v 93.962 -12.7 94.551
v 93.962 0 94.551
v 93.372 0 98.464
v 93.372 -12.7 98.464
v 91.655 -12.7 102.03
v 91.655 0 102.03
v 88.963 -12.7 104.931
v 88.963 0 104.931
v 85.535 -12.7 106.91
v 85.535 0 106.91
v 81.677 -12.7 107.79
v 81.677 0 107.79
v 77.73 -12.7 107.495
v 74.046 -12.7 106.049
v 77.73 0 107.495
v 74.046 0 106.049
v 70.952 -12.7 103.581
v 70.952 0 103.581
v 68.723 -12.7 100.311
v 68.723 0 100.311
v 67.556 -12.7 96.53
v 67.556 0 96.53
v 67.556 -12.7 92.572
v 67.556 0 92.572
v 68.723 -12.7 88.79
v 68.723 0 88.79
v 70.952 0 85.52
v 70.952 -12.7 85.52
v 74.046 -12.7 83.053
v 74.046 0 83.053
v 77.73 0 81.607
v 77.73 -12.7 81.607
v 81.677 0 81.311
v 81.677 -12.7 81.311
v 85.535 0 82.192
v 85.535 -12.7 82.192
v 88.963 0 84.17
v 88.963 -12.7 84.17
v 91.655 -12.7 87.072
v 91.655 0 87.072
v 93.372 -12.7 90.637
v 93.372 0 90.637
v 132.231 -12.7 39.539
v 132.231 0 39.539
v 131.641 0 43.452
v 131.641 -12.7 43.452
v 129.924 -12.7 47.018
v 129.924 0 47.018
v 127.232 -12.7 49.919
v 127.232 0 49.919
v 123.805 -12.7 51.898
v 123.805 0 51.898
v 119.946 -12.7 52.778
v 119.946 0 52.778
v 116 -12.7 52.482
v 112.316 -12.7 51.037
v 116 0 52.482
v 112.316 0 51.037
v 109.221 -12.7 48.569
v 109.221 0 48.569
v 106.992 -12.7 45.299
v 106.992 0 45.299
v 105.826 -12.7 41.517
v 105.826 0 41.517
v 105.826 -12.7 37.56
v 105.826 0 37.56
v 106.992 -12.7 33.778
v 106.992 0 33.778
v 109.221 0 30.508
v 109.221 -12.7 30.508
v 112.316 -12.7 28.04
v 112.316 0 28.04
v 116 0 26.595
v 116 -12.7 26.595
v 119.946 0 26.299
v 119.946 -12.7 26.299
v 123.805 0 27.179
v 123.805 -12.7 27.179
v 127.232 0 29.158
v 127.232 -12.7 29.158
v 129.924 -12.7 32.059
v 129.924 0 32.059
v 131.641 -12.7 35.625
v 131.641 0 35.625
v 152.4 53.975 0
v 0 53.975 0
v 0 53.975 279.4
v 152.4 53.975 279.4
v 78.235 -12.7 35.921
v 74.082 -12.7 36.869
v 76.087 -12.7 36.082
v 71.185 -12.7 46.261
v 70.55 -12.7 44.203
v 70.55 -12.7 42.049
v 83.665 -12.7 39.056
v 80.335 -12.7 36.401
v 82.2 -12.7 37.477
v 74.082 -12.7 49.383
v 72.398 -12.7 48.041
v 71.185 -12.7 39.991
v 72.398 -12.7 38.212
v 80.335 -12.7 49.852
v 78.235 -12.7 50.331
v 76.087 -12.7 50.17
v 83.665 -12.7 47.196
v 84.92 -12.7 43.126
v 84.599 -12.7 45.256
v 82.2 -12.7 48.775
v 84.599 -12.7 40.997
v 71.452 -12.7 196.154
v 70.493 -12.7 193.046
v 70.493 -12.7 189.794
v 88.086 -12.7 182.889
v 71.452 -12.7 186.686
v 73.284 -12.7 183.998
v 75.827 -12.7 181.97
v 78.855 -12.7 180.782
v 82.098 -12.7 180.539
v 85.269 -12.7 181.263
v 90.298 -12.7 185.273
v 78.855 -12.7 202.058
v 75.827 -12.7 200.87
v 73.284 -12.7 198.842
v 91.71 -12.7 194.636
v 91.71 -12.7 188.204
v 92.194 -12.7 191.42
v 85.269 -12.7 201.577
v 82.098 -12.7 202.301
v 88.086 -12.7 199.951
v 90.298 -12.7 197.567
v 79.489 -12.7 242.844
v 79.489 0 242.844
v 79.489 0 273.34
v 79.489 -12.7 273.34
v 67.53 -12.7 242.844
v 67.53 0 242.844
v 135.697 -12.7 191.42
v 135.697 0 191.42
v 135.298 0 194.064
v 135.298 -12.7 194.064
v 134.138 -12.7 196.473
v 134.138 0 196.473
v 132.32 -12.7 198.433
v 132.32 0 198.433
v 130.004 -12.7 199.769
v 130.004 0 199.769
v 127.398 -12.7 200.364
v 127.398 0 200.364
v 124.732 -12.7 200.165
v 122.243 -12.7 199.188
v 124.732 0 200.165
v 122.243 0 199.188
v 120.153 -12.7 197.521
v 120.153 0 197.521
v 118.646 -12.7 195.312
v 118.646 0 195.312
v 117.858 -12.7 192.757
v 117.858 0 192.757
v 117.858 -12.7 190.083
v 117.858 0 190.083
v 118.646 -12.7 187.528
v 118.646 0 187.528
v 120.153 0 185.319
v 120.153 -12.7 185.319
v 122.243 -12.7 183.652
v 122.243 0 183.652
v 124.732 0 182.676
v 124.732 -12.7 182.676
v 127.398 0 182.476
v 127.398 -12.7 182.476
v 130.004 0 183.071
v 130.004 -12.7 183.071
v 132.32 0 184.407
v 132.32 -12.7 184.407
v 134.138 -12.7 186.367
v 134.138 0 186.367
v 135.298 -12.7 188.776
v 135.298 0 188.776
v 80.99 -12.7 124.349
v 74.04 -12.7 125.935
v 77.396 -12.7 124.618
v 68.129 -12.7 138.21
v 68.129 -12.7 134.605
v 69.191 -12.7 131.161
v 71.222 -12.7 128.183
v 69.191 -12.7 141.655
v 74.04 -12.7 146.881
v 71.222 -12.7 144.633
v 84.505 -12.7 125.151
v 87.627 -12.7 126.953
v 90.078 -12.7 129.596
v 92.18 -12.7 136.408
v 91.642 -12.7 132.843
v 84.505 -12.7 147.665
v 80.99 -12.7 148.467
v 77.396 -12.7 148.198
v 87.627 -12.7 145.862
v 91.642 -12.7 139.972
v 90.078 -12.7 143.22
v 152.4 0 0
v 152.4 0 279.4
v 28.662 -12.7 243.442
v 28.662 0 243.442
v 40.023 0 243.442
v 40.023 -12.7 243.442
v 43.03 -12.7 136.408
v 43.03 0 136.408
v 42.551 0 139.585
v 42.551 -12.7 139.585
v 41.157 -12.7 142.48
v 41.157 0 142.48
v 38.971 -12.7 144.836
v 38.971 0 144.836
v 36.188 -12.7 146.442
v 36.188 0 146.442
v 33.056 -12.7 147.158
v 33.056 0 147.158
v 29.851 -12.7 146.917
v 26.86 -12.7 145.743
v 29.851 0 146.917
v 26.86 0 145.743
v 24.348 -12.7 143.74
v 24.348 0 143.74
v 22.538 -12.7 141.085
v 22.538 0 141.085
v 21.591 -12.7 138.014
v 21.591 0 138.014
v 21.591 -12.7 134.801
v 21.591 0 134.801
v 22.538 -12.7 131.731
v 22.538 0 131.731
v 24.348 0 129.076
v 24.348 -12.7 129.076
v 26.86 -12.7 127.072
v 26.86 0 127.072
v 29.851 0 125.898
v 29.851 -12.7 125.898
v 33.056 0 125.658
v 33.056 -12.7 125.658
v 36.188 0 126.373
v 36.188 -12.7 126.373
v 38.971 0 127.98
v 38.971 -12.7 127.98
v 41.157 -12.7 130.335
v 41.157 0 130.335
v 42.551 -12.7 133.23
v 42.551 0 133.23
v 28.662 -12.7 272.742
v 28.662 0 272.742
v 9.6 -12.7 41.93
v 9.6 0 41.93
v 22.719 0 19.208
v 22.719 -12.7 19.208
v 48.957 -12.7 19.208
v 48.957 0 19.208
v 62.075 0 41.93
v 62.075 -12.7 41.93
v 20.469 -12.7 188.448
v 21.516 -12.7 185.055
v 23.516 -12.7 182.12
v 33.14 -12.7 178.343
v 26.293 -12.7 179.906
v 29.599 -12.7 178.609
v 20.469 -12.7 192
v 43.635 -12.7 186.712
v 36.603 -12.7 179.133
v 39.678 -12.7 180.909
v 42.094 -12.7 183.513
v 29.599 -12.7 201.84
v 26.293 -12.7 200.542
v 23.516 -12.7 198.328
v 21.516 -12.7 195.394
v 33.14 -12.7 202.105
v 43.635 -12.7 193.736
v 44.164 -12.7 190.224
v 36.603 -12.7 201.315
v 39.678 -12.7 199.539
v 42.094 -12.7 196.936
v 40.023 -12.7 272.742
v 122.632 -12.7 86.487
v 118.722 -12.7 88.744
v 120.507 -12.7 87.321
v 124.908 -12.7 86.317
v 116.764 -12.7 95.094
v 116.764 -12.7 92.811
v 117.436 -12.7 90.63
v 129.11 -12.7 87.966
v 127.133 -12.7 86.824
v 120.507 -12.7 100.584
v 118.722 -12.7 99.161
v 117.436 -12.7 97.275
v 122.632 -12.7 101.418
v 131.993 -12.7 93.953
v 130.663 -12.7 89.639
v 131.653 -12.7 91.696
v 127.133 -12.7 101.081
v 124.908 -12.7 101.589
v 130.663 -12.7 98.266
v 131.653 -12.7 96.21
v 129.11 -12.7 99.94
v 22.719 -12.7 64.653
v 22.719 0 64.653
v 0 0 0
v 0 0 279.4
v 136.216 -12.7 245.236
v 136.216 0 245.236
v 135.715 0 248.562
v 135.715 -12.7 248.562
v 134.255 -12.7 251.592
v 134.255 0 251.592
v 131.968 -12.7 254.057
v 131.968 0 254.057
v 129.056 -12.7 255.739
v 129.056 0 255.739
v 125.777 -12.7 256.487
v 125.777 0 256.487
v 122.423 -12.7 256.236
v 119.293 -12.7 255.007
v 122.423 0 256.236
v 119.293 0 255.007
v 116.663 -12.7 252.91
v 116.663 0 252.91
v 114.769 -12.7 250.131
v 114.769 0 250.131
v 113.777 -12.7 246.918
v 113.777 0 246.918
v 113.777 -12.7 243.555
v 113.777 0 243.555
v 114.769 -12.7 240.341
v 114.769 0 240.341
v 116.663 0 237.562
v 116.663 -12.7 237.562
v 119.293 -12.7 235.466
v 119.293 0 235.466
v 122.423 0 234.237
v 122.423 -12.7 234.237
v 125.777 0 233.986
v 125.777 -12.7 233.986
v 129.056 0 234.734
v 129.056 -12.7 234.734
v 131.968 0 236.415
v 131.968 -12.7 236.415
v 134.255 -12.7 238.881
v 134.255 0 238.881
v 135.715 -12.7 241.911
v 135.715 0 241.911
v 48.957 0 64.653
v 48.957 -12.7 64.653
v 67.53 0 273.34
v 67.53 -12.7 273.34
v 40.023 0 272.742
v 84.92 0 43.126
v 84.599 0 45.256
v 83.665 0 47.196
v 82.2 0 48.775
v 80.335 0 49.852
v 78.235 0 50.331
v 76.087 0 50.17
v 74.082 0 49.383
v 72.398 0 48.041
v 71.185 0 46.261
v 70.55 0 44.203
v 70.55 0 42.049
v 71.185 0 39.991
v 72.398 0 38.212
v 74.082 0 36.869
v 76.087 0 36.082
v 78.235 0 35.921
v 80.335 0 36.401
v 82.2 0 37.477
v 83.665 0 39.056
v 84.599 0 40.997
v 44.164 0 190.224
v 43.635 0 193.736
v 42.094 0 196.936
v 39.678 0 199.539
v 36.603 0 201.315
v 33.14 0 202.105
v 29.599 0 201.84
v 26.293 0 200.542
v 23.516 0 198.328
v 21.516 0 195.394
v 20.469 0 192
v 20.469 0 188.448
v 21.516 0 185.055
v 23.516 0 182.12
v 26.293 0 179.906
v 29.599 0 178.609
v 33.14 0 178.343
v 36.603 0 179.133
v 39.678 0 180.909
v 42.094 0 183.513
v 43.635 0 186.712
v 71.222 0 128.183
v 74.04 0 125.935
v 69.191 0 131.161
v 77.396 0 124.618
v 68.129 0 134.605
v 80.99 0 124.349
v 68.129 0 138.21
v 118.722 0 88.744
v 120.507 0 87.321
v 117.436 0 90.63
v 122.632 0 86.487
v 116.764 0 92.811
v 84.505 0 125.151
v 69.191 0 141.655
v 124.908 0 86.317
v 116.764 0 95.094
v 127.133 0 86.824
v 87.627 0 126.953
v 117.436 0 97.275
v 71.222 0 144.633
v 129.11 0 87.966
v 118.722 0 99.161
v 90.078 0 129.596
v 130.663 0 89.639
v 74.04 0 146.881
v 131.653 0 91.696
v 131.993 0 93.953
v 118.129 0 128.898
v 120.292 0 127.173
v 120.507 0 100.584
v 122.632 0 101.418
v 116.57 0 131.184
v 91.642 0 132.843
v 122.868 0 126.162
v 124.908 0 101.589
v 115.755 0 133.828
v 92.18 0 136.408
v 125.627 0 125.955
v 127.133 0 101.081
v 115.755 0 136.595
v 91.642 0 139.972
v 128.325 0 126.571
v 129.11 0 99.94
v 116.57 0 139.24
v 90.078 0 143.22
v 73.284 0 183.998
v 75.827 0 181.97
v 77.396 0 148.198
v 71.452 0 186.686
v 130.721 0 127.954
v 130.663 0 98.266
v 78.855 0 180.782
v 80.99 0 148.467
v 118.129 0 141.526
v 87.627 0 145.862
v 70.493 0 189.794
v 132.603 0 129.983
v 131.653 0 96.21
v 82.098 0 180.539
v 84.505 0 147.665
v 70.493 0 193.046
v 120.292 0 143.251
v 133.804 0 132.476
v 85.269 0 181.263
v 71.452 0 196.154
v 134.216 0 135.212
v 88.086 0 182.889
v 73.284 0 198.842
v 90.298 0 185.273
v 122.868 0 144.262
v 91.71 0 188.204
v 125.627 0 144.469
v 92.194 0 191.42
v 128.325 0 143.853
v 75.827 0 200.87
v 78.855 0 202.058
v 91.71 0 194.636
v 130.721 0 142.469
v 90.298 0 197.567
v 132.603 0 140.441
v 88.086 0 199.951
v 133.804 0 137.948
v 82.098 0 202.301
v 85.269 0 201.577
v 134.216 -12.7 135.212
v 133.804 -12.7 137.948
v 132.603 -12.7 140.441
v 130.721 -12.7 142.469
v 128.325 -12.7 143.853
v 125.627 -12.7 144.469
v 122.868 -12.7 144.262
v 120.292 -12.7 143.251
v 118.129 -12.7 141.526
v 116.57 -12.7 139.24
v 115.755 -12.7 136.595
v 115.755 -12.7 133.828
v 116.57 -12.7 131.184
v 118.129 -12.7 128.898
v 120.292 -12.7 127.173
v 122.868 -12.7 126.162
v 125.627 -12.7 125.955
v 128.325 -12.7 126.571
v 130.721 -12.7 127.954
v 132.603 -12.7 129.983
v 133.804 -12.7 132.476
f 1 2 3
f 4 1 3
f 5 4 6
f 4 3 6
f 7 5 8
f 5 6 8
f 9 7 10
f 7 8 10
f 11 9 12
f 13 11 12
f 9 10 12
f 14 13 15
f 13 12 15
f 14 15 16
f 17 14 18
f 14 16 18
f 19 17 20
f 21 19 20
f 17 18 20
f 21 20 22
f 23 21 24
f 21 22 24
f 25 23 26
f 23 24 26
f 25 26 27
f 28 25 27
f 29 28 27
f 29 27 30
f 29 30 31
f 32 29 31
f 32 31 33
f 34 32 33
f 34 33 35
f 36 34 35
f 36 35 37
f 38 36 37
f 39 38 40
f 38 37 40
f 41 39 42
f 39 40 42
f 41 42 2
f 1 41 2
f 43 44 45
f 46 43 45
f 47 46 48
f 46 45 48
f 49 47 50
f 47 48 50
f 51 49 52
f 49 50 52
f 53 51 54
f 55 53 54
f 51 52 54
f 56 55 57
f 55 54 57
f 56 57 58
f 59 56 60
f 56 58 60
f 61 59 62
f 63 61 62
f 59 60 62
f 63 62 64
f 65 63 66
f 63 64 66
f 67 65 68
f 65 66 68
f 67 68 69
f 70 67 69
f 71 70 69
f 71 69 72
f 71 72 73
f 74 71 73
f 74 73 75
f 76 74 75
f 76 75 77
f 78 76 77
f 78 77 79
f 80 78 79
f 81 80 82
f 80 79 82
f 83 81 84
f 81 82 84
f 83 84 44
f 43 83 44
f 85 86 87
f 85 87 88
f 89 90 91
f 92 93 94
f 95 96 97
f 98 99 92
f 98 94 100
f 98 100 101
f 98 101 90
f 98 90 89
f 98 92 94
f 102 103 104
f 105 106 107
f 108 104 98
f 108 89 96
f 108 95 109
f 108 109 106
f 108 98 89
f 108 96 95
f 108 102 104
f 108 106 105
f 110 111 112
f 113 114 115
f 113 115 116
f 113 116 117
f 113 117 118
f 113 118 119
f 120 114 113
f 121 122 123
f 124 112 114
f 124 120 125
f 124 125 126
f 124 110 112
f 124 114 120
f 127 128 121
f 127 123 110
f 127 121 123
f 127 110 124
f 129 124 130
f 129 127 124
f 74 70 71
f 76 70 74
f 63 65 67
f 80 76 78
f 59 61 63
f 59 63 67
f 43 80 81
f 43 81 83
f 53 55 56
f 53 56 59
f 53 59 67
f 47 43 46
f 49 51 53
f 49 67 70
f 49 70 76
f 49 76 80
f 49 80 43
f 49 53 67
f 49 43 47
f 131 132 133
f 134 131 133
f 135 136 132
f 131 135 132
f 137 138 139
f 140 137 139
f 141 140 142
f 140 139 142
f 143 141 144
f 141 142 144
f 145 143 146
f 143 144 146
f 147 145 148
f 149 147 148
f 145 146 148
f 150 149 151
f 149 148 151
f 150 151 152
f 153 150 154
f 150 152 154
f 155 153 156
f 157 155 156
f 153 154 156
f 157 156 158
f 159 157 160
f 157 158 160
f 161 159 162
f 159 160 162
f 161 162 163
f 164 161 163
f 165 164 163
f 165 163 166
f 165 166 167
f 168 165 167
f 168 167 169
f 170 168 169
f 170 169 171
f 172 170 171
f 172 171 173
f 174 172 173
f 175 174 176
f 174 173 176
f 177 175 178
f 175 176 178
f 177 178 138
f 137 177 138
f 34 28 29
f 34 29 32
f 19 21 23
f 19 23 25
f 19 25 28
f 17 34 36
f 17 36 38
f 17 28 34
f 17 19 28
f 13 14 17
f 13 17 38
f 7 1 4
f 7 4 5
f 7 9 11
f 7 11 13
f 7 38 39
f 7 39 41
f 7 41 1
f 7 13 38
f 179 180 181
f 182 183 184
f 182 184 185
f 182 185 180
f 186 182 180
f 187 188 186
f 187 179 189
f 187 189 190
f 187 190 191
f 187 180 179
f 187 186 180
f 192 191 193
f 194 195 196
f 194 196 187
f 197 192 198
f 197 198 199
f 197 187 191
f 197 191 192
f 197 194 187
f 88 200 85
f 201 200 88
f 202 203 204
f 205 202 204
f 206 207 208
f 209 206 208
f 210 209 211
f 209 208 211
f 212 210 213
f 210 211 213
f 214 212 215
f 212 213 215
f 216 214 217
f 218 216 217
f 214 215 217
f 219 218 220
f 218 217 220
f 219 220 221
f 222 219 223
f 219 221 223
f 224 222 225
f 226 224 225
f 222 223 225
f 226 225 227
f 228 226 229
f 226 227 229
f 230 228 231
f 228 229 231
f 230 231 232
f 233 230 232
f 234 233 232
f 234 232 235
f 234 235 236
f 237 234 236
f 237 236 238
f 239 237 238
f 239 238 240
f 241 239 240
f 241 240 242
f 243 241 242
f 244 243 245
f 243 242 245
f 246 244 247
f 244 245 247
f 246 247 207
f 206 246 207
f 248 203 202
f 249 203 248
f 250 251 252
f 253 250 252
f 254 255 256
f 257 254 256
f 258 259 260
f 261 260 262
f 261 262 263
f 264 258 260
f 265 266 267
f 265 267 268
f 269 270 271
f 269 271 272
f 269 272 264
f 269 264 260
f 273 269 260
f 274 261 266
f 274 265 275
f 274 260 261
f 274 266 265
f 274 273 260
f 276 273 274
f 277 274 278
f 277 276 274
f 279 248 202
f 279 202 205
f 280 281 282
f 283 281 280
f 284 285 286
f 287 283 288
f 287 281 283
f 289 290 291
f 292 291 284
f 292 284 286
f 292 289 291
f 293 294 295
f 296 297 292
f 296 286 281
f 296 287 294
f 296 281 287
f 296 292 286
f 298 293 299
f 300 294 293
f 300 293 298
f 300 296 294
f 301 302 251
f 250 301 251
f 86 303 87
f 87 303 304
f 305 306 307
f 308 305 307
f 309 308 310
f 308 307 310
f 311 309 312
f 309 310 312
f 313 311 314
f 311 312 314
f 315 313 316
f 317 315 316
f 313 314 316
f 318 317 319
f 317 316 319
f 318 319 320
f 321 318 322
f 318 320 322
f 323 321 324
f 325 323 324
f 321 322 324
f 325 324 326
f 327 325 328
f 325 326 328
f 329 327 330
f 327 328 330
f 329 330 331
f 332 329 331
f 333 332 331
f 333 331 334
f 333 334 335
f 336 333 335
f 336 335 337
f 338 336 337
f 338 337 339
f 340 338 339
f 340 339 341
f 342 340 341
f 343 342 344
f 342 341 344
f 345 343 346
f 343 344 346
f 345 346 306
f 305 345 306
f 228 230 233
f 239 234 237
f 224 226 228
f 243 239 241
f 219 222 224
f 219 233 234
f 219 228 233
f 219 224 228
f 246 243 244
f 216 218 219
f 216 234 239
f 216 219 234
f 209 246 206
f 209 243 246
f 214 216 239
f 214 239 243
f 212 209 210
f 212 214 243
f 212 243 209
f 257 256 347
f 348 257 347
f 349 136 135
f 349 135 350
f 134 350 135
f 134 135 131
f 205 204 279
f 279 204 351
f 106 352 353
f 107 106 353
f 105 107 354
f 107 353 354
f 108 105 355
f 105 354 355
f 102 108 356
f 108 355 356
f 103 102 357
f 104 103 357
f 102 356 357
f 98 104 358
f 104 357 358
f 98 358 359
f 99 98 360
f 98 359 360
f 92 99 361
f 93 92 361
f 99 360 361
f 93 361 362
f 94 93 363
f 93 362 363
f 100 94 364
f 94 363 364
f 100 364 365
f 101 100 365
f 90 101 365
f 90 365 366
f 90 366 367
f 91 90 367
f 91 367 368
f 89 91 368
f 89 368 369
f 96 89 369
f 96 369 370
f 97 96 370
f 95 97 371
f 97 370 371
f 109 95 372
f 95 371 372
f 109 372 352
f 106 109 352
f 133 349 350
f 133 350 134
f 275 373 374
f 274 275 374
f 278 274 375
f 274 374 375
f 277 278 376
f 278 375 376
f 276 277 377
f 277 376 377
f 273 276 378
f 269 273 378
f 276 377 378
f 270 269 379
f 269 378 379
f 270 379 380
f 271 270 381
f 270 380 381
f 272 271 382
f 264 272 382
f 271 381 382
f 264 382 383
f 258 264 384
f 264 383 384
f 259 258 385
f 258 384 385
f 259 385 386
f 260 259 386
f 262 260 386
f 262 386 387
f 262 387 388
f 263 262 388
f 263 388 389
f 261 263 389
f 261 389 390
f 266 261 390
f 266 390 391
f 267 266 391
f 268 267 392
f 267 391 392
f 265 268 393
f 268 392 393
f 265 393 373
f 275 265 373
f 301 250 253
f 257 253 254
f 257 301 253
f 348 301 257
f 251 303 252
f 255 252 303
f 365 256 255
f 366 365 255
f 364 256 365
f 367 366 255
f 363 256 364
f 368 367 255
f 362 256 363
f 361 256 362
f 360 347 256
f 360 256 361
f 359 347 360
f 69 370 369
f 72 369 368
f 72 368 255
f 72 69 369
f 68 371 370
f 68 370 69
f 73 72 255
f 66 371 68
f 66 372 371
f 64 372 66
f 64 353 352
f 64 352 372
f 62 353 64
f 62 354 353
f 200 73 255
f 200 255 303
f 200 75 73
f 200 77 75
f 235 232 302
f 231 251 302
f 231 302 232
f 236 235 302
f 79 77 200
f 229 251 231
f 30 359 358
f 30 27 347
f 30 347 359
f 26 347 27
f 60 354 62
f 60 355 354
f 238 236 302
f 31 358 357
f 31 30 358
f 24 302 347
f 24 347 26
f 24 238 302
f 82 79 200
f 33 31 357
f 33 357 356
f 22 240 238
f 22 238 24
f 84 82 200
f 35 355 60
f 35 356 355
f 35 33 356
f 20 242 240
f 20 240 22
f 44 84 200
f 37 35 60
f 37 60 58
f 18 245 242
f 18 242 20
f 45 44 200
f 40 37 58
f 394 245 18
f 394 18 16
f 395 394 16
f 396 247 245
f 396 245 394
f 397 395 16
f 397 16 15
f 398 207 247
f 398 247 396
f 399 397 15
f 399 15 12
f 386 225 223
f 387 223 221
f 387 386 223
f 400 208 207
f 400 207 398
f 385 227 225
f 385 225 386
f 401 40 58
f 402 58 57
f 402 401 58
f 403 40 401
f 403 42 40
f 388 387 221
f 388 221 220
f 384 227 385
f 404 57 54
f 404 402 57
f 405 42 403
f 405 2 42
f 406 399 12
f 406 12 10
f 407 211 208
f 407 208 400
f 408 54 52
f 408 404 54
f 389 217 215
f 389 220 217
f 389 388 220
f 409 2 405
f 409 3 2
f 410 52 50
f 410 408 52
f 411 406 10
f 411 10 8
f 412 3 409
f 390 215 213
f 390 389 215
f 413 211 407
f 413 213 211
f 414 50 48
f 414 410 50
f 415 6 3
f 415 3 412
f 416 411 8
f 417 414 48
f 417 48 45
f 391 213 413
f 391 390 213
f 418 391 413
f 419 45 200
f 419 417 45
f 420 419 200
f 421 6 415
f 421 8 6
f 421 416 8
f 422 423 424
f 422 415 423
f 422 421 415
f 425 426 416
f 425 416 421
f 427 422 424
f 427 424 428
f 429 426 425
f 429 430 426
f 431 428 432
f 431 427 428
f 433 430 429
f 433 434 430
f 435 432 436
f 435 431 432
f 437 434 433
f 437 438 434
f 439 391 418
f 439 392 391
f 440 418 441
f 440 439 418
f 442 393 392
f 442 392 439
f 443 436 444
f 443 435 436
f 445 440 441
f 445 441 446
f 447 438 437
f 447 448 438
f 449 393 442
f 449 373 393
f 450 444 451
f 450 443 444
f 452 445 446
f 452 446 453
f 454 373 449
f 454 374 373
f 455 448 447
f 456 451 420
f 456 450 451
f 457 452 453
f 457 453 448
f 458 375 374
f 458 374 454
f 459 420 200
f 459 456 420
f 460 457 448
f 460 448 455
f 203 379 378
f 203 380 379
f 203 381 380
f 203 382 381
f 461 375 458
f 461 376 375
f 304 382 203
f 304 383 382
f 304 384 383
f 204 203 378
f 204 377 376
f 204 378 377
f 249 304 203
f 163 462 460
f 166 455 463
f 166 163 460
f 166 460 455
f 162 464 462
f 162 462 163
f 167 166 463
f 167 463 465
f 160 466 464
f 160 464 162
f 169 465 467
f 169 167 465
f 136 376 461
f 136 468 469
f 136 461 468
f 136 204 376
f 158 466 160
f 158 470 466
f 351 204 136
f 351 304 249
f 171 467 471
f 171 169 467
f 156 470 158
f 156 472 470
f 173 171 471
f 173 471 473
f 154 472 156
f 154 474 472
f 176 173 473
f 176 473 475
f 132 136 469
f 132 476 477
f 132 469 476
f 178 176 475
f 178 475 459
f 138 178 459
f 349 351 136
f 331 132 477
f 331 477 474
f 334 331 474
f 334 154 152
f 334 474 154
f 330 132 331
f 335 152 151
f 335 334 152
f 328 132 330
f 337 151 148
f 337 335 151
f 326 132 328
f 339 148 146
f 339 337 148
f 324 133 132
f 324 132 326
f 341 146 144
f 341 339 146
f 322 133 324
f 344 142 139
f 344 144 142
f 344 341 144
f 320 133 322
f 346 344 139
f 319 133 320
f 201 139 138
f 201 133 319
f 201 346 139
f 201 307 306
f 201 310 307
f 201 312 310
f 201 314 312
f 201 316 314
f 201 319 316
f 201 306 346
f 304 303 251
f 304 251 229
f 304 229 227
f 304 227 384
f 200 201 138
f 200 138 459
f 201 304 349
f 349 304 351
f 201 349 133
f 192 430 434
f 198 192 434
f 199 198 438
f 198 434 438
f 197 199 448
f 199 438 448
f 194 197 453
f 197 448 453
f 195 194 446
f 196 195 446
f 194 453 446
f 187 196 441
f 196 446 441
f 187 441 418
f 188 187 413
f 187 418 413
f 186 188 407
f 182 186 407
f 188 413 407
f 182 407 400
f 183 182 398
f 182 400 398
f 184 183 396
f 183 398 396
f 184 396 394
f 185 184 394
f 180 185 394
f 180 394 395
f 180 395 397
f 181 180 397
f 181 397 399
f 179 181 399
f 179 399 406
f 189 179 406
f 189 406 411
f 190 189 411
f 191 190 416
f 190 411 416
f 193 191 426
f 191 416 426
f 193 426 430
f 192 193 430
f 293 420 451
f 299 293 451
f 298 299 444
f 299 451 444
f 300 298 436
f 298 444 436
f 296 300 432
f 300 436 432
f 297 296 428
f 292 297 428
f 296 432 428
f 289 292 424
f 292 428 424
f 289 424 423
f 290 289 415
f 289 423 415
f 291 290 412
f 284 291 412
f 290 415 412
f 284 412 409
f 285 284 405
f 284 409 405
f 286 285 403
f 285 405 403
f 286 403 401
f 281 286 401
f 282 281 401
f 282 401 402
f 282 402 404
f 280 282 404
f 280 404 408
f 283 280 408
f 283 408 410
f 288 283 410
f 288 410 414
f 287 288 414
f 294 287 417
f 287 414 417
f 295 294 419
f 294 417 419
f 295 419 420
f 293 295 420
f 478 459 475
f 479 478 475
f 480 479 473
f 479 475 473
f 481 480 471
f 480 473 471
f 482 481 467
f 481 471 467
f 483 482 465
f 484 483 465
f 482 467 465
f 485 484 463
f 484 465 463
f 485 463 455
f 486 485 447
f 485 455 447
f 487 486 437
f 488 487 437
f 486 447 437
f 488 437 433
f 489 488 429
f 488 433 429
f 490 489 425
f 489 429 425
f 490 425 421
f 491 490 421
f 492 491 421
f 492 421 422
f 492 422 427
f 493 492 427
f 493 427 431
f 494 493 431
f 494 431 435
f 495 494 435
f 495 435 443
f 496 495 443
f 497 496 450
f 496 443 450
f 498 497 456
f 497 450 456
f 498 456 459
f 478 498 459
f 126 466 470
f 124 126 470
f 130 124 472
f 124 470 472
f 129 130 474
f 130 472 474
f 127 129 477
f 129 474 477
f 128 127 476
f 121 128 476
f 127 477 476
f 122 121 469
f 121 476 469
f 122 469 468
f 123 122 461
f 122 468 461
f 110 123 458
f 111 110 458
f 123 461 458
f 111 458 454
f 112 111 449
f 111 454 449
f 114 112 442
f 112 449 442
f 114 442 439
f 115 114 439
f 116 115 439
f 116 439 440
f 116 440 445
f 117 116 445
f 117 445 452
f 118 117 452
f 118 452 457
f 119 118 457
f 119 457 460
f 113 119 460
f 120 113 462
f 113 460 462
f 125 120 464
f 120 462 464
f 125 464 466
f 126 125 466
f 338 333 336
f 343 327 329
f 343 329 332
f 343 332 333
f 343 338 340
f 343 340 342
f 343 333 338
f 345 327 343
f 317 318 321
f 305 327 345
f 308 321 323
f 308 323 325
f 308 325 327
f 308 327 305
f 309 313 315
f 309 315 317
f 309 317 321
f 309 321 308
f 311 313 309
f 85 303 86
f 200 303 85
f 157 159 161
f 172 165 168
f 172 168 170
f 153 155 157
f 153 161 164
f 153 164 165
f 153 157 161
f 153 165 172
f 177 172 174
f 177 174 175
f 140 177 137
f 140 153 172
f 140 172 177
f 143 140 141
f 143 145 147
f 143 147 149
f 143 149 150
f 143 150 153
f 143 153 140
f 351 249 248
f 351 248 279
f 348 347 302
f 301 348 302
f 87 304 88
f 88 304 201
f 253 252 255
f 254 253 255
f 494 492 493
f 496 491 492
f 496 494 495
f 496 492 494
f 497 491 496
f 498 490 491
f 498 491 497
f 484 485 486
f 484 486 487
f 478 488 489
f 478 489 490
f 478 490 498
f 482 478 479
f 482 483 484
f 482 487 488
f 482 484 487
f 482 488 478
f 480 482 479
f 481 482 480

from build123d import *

# Parameters (mm, degrees)
F0_W     = 152.4
F0_H     = 279.4
F1_DEPTH = 53.975
F2_R     = 10.779843
F2_R_2   = 11.914255
F2_W     = 11.361208
F2_H     = 29.29996
F2_W_2   = 11.959181
F2_H_2   = 30.495897
F2_R_3   = 10.911721
F2_R_4   = 12.092973
F2_R_5   = 13.276833
F2_R_6   = 13.27683
F2_R_7   = 7.22516
F2_R_8   = 7.657603
F2_R_9   = 9.282801
F2_R_10  = 8.96937
F2_R_11  = 11.282249
F3_DEPTH = 12.7


with BuildPart() as f1:
    # F0 (on Front) → F1 (new body)
    with BuildSketch(Plane.XZ):
        with Locations((76.2, 139.7)):
            Rectangle(F0_W, F0_H)
    extrude(amount=-F1_DEPTH)

    # F2 (on face) → F3 (join)
    with BuildSketch(Plane.XZ):
        Polygon((48.956591, 64.652771), (22.718993, 64.652771), (9.600193, 41.930344), (22.718993, 19.207917), (48.956591, 19.207917), (62.07539, 41.930344), align=None)
        with Locations((32.250043, 136.407822)):
            Circle(F2_R)
        with Locations((32.250043, 190.224111)):
            Circle(F2_R_2)
        with Locations((34.342894, 258.092411)):
            Rectangle(F2_W, F2_H)
        with Locations((73.509186, 258.092425)):
            Rectangle(F2_W_2, F2_H_2)
        with Locations((81.28266, 191.420019)):
            Circle(F2_R_3)
        with Locations((80.08673, 136.407822)):
            Circle(F2_R_4)
        with Locations((80.684699, 94.550714)):
            Circle(F2_R_5)
        with Locations((118.954055, 39.53851)):
            Circle(F2_R_6)
        with Locations((77.694908, 43.126259)):
            Circle(F2_R_7)
        with Locations((124.335676, 93.952753)):
            Circle(F2_R_8)
        with Locations((124.933645, 135.2119)):
            Circle(F2_R_9)
        with Locations((126.727521, 191.420019)):
            Circle(F2_R_10)
        with Locations((124.933645, 245.236307)):
            Circle(F2_R_11)
    extrude(amount=F3_DEPTH)


solid = f1.part
